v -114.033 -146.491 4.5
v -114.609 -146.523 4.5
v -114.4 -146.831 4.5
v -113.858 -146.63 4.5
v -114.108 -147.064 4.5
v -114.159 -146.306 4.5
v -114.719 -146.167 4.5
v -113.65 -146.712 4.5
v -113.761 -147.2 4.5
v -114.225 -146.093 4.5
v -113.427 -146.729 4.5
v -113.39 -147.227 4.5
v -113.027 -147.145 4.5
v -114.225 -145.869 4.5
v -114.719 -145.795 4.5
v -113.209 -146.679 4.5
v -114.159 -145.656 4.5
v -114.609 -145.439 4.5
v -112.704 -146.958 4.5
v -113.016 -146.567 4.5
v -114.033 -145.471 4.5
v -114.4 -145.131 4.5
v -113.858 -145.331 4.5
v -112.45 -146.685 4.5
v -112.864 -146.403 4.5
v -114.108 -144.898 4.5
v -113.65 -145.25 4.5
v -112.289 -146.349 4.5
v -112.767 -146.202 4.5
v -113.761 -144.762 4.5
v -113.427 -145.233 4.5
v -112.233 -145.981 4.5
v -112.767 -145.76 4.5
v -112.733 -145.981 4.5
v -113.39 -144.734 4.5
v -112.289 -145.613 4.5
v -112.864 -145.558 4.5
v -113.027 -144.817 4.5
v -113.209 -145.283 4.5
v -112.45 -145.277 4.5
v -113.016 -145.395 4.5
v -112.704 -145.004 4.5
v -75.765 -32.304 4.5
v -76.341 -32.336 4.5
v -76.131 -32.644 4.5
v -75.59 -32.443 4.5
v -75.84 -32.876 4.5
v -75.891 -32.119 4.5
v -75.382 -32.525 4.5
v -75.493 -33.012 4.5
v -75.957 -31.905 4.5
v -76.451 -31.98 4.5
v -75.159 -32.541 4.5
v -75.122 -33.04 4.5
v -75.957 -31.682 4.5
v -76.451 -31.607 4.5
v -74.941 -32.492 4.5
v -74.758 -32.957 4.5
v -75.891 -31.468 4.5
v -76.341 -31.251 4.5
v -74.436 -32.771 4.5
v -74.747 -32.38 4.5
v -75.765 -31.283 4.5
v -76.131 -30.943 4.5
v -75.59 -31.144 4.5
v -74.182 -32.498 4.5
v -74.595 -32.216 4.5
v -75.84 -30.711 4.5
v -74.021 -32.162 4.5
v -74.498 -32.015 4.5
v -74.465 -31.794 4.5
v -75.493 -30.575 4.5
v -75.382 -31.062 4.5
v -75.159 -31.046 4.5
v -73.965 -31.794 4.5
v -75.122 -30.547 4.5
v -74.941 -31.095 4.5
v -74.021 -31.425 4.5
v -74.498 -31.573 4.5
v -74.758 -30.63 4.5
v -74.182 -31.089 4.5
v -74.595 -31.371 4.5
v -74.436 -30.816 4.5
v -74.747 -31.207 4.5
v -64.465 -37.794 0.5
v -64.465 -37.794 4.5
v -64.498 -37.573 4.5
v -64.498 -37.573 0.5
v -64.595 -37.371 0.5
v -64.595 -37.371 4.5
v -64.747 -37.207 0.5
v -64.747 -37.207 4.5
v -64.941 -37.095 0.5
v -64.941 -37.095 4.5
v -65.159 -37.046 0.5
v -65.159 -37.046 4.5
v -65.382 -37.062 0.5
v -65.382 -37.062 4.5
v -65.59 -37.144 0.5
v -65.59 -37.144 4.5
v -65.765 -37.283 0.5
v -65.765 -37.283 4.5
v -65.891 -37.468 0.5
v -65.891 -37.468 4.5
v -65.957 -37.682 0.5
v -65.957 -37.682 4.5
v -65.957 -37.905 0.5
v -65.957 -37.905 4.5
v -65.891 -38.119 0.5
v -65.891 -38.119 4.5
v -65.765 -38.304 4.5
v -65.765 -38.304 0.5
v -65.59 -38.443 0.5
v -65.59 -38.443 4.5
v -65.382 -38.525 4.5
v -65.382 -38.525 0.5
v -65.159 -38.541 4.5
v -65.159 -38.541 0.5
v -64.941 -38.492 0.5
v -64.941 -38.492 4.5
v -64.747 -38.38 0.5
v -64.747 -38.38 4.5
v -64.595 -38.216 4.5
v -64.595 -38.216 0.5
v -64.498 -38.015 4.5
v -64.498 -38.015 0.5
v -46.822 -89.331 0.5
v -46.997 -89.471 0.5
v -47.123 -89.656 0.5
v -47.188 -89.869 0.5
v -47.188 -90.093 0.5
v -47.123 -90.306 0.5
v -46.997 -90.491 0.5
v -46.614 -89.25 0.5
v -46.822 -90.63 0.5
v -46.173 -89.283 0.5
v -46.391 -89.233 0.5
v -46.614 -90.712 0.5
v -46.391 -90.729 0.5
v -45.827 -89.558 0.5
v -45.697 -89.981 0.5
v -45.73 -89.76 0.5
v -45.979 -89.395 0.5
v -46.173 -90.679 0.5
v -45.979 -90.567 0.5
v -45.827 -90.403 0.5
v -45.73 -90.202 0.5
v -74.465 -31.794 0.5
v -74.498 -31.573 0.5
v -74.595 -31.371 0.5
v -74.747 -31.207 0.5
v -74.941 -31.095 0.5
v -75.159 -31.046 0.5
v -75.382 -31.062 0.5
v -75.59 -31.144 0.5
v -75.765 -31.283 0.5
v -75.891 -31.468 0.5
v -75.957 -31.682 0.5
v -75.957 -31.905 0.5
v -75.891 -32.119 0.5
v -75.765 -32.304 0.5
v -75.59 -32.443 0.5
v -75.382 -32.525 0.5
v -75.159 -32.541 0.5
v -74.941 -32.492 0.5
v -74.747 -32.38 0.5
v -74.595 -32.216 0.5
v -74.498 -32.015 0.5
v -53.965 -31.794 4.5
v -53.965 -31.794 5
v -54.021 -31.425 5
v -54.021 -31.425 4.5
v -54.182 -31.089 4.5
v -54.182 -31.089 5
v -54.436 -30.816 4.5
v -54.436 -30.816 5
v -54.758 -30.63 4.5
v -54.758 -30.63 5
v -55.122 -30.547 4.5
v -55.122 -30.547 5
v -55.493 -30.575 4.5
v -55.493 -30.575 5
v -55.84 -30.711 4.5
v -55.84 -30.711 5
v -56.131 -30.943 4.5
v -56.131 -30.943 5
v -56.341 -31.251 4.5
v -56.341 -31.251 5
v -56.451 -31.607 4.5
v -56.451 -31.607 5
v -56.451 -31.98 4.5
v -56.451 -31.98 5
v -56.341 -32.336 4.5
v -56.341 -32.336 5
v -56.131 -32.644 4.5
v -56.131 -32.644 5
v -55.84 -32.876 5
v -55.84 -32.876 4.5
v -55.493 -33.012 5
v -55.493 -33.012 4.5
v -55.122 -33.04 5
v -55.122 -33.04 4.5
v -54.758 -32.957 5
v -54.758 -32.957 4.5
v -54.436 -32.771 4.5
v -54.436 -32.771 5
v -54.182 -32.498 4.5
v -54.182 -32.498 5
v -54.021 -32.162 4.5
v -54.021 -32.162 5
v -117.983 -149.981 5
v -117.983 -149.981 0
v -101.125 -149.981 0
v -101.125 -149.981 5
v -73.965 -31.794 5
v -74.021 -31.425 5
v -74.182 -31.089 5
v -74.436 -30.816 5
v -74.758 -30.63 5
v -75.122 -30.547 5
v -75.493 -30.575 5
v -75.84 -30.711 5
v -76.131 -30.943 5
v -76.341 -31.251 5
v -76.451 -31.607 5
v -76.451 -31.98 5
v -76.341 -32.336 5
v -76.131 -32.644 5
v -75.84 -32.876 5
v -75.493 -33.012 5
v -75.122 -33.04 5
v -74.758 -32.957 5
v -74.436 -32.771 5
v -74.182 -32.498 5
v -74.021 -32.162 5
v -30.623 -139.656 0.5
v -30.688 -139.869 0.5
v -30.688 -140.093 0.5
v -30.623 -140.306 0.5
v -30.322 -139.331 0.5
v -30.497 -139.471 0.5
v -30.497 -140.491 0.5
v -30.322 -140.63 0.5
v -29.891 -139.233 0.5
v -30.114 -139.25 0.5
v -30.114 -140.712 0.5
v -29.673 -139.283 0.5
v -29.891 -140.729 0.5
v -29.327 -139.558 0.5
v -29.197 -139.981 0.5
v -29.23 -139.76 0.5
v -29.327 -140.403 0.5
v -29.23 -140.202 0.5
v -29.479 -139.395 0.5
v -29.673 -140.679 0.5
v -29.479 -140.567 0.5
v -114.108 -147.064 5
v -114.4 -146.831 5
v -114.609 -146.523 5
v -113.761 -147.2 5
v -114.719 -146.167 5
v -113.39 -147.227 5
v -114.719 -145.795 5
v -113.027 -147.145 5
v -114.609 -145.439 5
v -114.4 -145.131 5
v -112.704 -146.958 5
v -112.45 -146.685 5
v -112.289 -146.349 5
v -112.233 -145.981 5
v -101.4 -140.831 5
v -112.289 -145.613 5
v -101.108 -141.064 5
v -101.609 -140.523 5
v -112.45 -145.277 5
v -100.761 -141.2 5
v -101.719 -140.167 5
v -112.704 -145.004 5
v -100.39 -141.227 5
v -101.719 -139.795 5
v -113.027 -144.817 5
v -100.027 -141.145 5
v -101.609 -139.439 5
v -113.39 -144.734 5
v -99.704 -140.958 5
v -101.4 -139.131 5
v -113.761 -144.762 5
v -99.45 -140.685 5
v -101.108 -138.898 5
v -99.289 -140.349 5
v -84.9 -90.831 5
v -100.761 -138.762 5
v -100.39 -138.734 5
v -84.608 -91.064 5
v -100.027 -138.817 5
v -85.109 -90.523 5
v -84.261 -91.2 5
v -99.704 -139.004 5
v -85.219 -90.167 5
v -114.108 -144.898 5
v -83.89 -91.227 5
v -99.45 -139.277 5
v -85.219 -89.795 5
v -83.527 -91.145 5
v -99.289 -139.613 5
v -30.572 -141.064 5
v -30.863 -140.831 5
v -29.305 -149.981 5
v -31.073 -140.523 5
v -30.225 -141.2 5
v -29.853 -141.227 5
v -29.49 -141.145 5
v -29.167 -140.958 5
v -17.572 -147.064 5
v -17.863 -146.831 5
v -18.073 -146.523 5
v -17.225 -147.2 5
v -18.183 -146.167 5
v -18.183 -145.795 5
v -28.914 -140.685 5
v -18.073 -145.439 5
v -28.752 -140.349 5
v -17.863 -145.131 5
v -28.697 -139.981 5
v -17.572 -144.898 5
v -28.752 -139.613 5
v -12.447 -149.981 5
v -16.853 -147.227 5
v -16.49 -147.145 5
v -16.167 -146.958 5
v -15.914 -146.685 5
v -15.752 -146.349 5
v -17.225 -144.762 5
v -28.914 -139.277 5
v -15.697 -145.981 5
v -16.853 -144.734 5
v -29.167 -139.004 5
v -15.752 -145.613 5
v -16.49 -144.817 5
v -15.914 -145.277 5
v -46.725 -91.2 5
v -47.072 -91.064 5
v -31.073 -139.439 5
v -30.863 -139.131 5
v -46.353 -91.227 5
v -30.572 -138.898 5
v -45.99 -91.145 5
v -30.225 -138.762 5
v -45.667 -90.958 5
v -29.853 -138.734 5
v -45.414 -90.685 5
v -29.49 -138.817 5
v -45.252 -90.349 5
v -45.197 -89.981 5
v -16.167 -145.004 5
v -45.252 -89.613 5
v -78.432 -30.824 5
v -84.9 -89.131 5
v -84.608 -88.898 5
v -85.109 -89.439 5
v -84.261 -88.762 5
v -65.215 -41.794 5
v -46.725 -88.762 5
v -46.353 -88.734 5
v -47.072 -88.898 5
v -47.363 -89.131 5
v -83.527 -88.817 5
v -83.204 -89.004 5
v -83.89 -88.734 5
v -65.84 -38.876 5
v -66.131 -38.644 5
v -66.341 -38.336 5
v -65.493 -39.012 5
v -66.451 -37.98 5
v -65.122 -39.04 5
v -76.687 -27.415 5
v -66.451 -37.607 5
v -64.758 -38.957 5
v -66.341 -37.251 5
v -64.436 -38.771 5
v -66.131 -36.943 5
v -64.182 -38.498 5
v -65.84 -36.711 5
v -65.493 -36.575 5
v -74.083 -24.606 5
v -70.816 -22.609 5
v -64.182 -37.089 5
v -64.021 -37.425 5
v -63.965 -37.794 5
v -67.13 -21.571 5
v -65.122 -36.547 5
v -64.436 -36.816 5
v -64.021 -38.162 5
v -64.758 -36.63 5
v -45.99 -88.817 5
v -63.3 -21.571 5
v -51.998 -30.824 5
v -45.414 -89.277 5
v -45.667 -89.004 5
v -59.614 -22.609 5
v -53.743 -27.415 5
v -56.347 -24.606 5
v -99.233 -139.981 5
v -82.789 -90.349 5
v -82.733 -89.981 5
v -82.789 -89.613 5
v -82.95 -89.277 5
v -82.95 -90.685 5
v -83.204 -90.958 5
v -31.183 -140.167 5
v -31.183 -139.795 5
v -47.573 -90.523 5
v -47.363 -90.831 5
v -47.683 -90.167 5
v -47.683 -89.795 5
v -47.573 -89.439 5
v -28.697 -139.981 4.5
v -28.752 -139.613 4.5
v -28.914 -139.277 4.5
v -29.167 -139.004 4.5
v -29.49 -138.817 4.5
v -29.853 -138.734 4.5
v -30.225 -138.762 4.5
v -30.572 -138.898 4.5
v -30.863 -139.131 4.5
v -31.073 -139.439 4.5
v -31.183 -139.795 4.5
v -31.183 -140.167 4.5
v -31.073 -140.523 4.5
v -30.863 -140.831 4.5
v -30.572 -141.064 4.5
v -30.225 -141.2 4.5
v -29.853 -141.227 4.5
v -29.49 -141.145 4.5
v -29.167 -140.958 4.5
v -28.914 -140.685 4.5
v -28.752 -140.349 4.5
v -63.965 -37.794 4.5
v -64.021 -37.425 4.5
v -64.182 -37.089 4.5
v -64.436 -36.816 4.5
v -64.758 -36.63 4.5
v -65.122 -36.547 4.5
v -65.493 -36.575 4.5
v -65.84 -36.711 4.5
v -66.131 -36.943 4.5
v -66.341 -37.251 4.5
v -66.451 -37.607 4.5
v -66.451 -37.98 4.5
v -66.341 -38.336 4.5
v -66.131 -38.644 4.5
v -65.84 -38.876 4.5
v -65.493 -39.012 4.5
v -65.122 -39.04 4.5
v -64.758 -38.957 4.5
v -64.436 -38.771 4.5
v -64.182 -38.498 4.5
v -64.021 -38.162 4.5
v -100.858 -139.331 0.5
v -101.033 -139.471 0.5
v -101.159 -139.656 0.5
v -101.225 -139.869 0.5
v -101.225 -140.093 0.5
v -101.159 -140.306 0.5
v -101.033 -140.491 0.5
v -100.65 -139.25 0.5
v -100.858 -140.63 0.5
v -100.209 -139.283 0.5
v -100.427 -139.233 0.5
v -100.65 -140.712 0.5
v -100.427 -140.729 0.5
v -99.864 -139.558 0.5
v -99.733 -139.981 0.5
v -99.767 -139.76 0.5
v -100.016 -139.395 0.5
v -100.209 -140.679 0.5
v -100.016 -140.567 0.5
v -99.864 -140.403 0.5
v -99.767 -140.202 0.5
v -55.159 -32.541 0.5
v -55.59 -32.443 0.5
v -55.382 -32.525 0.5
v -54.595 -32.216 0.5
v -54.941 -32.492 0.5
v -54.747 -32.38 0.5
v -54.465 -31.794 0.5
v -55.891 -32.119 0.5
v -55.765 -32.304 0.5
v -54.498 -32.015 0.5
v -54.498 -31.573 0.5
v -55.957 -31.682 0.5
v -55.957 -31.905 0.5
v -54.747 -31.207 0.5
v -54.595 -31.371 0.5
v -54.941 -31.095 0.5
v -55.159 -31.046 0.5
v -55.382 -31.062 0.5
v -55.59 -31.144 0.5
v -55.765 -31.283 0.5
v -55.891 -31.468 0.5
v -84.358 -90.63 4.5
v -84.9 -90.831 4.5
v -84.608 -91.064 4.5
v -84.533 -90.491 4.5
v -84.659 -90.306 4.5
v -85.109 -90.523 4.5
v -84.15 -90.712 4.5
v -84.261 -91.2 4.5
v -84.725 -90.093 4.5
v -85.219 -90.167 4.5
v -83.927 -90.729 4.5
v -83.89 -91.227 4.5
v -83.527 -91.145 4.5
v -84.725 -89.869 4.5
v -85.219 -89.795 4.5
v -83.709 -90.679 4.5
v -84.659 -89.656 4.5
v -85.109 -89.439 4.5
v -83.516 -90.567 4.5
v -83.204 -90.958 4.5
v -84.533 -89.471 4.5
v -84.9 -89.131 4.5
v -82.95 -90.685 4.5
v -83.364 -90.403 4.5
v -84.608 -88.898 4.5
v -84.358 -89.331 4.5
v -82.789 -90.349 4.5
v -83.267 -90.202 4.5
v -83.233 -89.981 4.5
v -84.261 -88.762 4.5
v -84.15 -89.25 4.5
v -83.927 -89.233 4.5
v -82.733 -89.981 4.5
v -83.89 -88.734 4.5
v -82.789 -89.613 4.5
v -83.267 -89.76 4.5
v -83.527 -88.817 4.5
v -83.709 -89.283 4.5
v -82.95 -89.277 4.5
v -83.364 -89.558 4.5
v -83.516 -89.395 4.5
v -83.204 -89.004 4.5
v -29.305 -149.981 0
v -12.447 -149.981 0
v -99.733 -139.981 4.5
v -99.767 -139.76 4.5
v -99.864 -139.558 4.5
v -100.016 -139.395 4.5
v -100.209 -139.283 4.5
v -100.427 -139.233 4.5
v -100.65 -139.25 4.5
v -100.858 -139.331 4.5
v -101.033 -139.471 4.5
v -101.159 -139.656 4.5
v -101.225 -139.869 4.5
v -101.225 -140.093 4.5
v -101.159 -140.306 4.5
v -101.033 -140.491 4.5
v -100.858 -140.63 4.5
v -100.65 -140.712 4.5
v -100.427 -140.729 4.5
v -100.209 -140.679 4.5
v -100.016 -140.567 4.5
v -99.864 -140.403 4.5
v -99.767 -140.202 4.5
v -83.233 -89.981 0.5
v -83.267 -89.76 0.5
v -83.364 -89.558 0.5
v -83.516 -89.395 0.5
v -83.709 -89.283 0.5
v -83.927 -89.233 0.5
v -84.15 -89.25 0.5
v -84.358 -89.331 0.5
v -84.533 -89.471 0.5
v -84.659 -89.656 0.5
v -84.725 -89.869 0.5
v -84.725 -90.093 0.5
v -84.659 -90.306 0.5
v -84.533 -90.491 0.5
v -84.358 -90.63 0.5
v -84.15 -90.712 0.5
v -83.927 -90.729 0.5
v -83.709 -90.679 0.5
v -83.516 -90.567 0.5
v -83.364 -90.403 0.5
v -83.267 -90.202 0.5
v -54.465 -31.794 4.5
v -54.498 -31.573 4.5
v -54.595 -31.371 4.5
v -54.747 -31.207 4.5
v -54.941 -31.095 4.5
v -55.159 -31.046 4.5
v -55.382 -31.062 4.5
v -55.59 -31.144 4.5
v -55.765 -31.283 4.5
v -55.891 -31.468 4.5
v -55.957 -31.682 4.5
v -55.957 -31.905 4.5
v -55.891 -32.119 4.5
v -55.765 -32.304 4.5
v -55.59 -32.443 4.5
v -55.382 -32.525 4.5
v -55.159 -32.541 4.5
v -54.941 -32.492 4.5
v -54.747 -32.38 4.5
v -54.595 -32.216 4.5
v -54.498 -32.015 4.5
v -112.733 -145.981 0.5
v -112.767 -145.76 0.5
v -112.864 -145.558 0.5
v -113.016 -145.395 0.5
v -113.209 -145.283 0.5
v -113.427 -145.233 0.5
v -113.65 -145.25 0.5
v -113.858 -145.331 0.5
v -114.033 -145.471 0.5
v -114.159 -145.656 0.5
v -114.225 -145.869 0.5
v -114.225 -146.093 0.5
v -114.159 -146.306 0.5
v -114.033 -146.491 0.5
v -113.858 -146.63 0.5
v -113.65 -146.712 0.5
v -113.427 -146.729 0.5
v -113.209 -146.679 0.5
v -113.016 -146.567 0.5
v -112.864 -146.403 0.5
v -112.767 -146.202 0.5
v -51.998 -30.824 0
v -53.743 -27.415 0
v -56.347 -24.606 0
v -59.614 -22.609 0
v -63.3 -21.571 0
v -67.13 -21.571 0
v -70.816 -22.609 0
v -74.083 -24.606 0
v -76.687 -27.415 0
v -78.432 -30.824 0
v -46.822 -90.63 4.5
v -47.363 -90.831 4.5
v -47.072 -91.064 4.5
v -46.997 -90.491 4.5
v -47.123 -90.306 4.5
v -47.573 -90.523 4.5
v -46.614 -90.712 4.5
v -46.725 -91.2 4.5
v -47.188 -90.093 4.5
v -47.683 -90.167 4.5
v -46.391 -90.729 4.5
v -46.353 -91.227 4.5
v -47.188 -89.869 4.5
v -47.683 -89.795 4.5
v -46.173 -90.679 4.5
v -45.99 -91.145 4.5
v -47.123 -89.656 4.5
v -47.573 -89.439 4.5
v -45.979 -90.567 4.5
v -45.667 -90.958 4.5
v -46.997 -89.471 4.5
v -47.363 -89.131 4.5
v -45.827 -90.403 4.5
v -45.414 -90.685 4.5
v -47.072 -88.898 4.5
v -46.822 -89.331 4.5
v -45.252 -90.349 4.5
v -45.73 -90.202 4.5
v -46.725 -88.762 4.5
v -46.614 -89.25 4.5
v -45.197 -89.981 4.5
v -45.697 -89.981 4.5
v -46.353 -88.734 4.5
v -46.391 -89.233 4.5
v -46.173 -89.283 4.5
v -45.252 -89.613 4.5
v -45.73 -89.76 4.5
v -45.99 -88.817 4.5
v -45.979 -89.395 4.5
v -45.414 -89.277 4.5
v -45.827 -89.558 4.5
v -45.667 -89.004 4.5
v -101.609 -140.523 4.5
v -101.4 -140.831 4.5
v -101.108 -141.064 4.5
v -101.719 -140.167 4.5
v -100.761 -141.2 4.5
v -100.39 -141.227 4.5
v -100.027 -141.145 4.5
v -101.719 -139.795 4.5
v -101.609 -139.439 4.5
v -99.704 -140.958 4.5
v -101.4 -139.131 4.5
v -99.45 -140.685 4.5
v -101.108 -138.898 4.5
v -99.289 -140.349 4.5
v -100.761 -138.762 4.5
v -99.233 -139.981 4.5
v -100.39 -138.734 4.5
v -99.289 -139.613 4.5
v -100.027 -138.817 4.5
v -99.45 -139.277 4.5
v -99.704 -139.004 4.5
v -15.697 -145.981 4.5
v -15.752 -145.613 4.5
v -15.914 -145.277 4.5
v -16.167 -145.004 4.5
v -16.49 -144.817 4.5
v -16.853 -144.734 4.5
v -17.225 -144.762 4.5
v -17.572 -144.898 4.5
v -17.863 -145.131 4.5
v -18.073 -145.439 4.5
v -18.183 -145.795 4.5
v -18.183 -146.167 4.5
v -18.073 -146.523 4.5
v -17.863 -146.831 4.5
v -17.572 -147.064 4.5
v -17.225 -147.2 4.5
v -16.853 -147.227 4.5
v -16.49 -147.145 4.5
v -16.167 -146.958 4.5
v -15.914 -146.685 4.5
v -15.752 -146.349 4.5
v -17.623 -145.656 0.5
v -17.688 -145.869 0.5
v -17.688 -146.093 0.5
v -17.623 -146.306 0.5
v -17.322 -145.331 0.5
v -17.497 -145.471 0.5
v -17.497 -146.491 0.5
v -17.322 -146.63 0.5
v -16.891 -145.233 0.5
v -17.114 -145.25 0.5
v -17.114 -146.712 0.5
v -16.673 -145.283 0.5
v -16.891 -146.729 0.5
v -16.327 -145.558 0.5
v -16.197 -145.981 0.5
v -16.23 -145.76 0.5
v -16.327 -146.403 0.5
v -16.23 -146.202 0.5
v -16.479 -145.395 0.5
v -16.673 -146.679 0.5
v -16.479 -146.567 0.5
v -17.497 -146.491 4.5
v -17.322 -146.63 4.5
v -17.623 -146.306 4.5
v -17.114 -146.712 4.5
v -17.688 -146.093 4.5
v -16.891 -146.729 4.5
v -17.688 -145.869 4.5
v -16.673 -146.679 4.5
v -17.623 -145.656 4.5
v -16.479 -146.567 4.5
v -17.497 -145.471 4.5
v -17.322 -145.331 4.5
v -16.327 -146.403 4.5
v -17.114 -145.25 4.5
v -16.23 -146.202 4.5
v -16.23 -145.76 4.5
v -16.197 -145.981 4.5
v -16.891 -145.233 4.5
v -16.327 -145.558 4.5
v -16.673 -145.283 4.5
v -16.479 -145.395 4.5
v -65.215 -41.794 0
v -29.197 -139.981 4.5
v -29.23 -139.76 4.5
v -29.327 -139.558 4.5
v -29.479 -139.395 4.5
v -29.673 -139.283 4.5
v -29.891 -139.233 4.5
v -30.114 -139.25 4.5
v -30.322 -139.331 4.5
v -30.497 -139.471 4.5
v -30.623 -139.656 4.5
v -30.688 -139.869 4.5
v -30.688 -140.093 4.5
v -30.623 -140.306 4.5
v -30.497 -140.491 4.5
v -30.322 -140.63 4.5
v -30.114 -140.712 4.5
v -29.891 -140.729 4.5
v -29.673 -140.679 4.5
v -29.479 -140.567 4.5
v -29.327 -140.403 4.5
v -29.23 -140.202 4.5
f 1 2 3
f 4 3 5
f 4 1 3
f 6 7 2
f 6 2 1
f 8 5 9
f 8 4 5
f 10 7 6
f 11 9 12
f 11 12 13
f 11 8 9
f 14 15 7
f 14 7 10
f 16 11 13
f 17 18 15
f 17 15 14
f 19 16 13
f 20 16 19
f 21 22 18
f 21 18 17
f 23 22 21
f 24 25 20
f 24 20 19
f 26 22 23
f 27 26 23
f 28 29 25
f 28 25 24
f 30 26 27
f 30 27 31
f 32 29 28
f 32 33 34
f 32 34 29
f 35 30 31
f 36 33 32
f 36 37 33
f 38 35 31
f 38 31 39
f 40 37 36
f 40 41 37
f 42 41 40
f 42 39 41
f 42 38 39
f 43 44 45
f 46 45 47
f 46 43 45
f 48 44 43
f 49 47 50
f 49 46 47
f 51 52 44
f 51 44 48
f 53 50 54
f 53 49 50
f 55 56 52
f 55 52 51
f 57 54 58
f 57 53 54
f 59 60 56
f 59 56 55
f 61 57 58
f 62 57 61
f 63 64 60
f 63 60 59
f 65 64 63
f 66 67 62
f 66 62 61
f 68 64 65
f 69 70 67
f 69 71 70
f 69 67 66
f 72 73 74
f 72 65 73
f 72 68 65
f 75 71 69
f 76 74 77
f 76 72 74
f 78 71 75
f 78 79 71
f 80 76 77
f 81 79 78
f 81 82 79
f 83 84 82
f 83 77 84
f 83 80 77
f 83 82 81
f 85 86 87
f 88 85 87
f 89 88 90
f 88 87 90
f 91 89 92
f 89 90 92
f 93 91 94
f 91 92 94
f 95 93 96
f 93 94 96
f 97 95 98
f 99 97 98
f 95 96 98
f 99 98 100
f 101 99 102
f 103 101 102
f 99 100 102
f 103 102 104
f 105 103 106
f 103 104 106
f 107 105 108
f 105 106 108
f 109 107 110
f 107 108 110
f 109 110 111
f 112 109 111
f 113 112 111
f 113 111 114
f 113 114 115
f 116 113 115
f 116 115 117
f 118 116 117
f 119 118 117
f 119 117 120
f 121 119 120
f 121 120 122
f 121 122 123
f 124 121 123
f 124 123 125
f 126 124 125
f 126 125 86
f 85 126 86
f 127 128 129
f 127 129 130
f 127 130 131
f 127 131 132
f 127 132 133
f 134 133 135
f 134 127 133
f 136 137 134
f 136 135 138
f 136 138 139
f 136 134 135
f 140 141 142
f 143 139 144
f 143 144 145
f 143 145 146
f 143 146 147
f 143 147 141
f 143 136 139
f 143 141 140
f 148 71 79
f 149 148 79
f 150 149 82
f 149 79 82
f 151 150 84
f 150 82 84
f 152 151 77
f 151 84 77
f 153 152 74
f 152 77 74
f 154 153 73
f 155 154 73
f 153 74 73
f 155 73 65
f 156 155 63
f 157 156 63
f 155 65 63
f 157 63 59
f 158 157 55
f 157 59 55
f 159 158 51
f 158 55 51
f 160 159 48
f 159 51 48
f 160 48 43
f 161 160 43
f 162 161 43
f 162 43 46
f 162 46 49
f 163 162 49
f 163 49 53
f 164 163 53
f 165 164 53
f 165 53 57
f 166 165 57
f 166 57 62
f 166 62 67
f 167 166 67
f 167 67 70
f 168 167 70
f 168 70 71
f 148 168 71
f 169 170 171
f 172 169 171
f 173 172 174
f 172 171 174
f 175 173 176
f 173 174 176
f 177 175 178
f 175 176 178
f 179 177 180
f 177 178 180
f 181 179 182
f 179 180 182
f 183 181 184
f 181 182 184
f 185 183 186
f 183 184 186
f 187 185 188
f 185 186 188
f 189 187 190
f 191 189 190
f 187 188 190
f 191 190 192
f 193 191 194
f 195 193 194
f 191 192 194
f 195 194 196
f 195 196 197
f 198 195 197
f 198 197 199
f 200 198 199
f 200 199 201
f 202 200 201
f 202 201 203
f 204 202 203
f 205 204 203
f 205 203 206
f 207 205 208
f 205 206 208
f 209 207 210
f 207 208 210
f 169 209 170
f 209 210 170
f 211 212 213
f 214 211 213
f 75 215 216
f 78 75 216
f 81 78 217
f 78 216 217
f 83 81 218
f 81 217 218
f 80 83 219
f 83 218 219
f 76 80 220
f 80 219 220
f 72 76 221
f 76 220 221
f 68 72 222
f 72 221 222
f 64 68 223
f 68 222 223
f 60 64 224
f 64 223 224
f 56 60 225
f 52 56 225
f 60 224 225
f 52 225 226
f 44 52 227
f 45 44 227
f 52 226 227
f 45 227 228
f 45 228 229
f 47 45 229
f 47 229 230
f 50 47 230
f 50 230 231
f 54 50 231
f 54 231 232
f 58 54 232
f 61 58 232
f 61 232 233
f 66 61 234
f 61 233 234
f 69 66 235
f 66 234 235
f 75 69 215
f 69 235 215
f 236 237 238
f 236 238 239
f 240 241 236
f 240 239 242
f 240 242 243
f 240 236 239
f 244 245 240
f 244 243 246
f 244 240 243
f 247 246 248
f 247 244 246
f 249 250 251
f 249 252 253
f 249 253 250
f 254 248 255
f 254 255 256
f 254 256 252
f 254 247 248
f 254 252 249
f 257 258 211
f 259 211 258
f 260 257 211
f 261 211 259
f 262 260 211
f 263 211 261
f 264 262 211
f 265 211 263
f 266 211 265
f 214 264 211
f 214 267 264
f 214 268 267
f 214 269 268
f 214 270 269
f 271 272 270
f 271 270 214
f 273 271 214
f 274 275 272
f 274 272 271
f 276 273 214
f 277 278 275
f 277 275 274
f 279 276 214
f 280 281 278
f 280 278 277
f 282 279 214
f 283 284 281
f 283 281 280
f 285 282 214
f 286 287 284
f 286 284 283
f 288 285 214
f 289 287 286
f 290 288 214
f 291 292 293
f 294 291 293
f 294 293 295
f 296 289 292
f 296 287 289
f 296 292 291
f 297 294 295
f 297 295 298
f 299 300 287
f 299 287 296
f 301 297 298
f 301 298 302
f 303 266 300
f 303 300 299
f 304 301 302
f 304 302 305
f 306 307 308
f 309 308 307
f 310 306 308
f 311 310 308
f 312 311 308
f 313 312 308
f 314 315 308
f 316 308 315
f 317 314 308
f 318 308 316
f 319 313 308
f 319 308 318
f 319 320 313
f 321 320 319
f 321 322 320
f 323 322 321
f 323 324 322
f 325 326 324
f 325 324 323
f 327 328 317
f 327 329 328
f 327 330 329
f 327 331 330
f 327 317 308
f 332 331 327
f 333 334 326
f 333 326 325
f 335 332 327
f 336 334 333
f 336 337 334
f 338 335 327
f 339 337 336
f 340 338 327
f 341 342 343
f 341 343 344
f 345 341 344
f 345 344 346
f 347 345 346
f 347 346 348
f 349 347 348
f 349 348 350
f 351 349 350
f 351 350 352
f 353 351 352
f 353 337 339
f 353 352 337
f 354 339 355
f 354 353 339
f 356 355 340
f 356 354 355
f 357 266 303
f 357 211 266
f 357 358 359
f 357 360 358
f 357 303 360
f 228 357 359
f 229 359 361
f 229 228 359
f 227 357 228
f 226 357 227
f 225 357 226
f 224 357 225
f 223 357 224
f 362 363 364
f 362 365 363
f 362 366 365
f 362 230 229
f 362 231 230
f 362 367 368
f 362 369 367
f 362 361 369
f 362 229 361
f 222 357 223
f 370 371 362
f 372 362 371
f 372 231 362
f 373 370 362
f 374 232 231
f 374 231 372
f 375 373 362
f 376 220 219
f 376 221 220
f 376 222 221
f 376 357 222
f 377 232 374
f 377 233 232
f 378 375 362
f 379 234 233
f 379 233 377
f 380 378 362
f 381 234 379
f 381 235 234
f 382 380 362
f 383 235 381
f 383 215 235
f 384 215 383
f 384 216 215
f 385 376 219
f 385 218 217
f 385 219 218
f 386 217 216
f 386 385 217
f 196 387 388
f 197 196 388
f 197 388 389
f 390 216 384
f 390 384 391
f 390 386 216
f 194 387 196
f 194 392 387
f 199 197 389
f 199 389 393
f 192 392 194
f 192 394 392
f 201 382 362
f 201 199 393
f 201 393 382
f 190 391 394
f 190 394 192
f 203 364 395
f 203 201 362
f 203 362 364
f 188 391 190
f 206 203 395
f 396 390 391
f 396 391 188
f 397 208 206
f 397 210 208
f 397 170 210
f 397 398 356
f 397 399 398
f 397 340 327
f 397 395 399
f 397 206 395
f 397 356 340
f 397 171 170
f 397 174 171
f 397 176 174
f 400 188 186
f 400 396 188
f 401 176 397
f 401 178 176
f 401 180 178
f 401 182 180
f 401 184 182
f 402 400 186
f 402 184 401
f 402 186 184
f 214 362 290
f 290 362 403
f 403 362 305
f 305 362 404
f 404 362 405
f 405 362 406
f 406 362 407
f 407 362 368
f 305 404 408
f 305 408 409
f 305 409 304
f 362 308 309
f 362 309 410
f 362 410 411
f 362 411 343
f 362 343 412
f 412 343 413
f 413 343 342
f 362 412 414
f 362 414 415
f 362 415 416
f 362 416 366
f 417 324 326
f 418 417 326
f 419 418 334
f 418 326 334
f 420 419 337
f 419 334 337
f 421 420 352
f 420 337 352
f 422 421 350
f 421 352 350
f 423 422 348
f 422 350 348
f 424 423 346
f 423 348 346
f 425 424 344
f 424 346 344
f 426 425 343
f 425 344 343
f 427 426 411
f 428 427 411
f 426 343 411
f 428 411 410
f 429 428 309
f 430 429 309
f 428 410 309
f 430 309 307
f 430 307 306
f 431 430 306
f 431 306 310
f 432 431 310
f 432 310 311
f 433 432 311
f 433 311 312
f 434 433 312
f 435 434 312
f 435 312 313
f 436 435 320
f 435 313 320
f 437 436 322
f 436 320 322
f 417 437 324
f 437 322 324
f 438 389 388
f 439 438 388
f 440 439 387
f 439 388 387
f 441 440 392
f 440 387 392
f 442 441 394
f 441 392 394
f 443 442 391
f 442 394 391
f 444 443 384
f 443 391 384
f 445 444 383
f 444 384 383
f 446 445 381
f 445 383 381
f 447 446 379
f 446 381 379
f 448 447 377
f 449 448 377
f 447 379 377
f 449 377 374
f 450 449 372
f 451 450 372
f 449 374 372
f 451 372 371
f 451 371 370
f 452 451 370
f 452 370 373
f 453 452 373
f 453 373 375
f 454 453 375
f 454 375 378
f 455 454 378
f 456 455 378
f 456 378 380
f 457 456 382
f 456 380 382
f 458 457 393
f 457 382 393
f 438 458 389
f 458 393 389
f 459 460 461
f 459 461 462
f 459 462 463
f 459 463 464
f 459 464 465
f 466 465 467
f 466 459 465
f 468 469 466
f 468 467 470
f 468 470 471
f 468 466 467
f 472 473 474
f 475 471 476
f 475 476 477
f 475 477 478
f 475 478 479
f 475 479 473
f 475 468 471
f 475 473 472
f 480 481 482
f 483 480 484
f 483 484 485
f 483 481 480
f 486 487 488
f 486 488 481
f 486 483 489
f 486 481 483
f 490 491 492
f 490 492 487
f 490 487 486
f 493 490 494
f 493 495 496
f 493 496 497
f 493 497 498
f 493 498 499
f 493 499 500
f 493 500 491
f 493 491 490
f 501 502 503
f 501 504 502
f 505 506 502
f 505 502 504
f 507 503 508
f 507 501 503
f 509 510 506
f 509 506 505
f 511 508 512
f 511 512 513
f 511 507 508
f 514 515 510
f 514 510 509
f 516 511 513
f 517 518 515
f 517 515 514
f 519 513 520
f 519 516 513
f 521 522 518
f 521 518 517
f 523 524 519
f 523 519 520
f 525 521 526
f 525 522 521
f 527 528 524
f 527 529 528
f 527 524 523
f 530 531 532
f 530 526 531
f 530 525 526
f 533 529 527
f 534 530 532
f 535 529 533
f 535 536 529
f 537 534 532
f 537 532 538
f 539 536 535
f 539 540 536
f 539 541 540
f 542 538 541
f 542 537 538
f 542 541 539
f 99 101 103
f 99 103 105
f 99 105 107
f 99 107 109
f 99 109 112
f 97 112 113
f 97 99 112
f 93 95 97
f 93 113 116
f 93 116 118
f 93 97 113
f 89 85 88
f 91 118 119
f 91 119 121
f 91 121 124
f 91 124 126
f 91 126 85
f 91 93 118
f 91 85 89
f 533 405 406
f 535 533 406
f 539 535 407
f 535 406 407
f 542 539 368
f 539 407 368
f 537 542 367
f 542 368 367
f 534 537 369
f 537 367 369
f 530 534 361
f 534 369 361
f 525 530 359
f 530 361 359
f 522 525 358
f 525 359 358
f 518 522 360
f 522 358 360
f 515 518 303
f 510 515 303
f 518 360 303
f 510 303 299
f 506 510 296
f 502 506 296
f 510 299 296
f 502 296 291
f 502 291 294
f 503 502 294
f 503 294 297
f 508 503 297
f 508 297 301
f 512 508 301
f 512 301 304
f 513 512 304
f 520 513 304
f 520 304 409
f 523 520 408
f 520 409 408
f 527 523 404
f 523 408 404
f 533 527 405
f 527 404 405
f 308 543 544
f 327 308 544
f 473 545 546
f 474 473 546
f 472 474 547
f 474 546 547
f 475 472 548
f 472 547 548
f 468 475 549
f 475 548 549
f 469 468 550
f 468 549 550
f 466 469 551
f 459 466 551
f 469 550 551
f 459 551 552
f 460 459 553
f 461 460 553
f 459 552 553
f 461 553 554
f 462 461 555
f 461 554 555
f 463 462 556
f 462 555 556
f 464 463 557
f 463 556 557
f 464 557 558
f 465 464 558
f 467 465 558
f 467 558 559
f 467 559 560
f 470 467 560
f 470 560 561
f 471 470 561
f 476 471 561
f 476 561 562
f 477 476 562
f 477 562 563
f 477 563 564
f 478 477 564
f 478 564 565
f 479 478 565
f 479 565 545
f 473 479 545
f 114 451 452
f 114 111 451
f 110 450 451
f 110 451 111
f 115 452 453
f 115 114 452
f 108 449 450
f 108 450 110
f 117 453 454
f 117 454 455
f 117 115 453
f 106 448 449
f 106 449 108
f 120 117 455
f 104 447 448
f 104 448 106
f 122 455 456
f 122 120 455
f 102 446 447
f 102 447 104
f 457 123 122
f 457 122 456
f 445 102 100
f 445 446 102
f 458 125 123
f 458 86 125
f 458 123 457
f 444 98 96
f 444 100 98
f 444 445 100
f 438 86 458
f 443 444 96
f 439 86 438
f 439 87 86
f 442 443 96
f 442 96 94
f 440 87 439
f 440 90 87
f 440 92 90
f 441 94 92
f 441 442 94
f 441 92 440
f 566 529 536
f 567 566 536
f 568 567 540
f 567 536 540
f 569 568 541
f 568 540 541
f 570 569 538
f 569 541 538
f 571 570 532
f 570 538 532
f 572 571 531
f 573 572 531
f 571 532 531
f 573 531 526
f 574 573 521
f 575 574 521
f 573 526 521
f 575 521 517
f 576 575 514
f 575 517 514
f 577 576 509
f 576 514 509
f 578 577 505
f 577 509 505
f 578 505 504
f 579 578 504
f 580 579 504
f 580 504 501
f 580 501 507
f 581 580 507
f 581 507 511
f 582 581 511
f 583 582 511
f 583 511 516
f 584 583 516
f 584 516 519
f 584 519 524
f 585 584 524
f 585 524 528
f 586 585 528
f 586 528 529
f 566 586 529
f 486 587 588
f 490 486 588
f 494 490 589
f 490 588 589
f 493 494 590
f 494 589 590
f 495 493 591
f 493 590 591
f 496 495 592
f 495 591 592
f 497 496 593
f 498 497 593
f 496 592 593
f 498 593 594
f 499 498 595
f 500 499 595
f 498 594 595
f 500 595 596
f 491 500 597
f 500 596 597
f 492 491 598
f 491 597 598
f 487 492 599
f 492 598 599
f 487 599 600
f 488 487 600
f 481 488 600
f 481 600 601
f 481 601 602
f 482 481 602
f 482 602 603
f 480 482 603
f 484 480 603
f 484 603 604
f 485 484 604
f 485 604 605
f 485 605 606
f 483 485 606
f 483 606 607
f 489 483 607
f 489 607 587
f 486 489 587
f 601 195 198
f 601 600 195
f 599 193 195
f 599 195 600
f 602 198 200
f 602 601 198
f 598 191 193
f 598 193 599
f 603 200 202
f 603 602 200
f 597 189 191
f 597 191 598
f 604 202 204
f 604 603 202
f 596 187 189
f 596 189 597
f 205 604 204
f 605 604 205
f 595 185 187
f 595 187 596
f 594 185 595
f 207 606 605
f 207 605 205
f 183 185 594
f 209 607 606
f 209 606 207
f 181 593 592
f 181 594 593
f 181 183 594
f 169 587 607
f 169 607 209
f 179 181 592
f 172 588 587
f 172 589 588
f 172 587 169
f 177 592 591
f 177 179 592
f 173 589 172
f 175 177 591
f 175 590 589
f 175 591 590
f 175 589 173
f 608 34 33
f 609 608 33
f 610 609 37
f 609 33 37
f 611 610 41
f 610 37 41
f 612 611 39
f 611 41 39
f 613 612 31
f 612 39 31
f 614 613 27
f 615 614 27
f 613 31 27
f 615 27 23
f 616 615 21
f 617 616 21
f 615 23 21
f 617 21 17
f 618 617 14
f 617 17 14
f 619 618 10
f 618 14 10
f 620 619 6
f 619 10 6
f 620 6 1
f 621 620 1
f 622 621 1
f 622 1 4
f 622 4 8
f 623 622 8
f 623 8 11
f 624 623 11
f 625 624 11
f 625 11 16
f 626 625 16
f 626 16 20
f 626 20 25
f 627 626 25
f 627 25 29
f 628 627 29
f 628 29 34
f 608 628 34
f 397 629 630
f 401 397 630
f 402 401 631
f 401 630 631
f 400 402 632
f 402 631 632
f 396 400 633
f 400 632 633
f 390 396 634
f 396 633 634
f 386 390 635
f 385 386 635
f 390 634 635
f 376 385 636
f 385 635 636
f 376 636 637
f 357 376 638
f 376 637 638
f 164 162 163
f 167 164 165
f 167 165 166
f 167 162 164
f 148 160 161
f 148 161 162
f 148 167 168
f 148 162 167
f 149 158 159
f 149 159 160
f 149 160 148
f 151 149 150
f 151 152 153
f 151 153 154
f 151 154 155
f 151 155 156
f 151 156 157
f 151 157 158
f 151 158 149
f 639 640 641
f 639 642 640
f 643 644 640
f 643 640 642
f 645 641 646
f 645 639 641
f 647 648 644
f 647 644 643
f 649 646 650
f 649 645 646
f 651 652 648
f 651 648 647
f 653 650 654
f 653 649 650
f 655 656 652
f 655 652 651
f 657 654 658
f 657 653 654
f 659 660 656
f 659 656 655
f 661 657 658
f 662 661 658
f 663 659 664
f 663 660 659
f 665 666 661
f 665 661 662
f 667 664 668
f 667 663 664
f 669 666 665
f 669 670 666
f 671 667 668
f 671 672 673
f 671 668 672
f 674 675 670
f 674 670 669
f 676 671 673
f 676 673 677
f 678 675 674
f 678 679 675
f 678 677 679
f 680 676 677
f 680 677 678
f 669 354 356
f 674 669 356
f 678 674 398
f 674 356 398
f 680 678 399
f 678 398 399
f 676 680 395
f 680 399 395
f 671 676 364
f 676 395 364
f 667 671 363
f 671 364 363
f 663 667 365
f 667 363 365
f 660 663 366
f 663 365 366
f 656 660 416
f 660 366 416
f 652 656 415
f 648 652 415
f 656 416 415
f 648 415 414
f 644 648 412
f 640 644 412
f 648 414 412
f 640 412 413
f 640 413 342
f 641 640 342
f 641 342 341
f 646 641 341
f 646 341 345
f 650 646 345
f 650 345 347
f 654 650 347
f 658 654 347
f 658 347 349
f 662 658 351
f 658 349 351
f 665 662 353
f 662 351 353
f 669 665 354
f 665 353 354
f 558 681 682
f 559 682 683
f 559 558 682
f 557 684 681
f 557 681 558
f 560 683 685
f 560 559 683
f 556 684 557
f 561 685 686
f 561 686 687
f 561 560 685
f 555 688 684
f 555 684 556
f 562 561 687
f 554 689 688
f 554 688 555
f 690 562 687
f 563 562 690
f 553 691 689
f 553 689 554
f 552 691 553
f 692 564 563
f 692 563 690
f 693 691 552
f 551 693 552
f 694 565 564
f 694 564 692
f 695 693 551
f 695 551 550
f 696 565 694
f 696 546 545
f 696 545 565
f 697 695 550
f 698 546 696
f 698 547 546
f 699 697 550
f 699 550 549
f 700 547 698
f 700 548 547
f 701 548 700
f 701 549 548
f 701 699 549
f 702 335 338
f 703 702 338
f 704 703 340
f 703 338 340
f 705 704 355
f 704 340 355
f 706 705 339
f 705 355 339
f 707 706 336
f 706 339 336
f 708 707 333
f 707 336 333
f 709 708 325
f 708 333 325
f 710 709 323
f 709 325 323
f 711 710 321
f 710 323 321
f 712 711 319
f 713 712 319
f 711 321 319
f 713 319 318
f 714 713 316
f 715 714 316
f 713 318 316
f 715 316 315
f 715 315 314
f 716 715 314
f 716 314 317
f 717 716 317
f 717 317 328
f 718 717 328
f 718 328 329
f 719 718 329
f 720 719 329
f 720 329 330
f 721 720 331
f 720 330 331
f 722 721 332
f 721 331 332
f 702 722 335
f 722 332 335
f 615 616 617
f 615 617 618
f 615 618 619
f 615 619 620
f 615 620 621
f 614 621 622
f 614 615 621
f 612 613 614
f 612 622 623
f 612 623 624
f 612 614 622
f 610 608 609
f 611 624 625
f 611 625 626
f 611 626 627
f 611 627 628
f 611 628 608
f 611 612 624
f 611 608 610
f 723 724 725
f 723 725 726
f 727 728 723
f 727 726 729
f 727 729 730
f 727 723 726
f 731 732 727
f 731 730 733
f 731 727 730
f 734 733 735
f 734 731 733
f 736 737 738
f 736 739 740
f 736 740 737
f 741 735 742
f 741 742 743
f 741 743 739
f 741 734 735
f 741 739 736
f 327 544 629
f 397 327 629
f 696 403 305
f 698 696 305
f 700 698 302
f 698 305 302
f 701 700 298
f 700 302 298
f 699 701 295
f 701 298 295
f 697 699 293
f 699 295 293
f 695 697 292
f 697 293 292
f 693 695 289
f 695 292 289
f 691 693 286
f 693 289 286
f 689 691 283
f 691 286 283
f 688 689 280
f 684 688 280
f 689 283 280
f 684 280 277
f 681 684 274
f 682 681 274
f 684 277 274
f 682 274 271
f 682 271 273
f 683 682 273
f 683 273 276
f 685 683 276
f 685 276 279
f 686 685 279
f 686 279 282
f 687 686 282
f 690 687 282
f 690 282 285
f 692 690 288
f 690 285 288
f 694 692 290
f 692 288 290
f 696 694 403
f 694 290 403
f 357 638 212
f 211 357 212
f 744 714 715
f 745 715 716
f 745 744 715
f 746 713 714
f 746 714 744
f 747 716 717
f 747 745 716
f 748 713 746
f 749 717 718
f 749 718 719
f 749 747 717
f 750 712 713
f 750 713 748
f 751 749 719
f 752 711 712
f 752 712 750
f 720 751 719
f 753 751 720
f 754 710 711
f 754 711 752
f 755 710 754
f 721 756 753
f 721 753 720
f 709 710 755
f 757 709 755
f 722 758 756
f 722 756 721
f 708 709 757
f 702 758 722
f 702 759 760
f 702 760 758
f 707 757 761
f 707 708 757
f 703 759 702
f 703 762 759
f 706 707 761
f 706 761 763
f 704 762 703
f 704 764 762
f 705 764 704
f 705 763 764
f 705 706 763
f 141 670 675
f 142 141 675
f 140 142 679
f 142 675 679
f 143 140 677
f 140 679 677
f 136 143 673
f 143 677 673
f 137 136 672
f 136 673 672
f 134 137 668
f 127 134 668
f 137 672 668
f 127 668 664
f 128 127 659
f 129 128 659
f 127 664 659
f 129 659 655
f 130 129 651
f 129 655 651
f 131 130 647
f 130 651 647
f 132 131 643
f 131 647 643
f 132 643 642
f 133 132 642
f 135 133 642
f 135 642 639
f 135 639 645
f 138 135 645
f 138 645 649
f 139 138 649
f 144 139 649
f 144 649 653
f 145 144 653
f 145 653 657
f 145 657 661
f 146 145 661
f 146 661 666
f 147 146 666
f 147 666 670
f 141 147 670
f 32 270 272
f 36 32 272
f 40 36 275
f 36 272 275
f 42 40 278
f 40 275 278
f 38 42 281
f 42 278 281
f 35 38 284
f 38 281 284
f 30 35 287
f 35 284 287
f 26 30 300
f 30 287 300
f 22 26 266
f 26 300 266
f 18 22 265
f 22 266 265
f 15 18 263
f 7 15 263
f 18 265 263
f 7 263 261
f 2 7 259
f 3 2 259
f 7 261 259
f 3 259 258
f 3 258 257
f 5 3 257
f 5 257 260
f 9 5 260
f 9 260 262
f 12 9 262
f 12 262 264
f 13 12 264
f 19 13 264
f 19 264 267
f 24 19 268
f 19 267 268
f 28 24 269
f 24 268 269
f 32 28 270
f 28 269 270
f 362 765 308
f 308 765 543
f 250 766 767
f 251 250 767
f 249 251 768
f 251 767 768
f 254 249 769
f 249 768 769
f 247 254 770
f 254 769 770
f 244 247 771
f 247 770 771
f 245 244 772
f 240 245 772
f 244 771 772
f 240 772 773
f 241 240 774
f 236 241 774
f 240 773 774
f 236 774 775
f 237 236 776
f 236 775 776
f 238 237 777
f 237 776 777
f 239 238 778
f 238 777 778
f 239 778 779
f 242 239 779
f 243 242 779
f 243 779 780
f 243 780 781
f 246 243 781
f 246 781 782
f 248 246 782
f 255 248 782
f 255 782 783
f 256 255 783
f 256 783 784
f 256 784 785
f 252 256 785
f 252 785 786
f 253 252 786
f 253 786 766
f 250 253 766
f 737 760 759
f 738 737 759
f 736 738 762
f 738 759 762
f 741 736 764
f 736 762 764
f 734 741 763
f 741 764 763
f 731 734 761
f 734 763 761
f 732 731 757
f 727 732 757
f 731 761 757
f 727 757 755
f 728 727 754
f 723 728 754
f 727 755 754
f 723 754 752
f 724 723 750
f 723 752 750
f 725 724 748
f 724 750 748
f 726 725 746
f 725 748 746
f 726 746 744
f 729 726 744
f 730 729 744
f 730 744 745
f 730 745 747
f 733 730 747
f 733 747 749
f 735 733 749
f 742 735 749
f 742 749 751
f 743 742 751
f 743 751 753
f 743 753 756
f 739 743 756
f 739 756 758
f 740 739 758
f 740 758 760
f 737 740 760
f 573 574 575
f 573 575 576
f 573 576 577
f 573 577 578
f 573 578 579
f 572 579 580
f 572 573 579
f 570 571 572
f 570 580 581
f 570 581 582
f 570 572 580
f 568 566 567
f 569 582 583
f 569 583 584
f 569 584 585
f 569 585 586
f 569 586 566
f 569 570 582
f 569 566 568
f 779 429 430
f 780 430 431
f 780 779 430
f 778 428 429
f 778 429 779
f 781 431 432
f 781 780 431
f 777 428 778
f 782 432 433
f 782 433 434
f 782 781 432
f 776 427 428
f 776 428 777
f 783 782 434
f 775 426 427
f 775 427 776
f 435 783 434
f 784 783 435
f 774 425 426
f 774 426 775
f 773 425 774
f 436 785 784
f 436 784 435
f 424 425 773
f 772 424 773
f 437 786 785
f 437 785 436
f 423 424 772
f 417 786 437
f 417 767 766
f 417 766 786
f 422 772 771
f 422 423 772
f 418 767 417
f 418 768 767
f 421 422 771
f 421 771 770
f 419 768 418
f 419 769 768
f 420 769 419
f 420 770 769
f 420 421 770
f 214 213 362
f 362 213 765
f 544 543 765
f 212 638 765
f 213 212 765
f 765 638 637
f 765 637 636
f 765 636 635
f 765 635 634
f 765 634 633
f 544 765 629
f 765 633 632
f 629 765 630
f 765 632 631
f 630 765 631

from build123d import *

# Parameters (mm, degrees)
F1_DEPTH = 5
F2_R     = 0.75
F3_DEPTH = 4.5
F4_R     = 1.25
F5_DEPTH = 0.5


with BuildPart() as f1:
    # F0 (on Top) → F1 (new body)
    with BuildSketch(Plane.XY):
        with BuildLine():
            Line((-101.1249, -149.980971), (-65.215021, -41.793592))
            Line((-65.215021, -41.793592), (-29.305143, -149.980971))
            Line((-29.305143, -149.980971), (-12.446784, -149.980971))
            Line((-12.446784, -149.980971), (-51.997887, -30.823505))
            ThreePointArc((-51.997887, -30.823505), (-65.215021, -21.439494), (-78.432156, -30.823505))
            Line((-78.432156, -30.823505), (-117.983259, -149.980971))
            Line((-117.983259, -149.980971), (-101.1249, -149.980971))
        make_face()
    extrude(amount=F1_DEPTH)

    # F2 (on face) → F3 (cut)
    with BuildSketch(Plane.XY.offset(5)):
        with Locations((-65.215021, -37.793592)):
            Circle(F2_R)
        with Locations((-113.483259, -145.980971)):
            Circle(F2_R)
        with Locations((-100.483259, -139.980971)):
            Circle(F2_R)
        with Locations((-29.946784, -139.980971)):
            Circle(F2_R)
        with Locations((-16.946784, -145.980971)):
            Circle(F2_R)
        with Locations((-83.983259, -89.980971)):
            Circle(F2_R)
        with Locations((-46.446784, -89.980971)):
            Circle(F2_R)
        with Locations((-75.215021, -31.793592)):
            Circle(F2_R)
        with Locations((-55.215021, -31.793592)):
            Circle(F2_R)
    extrude(amount=-F3_DEPTH, mode=Mode.SUBTRACT)

    # F4 (on face) → F5 (cut)
    with BuildSketch(Plane.XY.offset(5)):
        with Locations((-75.215021, -31.793592)):
            Circle(F4_R)
        with Locations((-65.215021, -37.793592)):
            Circle(F4_R)
        with Locations((-55.215021, -31.793592)):
            Circle(F4_R)
        with Locations((-46.446784, -89.980971)):
            Circle(F4_R)
        with Locations((-83.983259, -89.980971)):
            Circle(F4_R)
        with Locations((-16.946784, -145.980971)):
            Circle(F4_R)
        with Locations((-29.946784, -139.980971)):
            Circle(F4_R)
        with Locations((-100.483259, -139.980971)):
            Circle(F4_R)
        with Locations((-113.483259, -145.980971)):
            Circle(F4_R)
    extrude(amount=-F5_DEPTH, mode=Mode.SUBTRACT)


solid = f1.part
